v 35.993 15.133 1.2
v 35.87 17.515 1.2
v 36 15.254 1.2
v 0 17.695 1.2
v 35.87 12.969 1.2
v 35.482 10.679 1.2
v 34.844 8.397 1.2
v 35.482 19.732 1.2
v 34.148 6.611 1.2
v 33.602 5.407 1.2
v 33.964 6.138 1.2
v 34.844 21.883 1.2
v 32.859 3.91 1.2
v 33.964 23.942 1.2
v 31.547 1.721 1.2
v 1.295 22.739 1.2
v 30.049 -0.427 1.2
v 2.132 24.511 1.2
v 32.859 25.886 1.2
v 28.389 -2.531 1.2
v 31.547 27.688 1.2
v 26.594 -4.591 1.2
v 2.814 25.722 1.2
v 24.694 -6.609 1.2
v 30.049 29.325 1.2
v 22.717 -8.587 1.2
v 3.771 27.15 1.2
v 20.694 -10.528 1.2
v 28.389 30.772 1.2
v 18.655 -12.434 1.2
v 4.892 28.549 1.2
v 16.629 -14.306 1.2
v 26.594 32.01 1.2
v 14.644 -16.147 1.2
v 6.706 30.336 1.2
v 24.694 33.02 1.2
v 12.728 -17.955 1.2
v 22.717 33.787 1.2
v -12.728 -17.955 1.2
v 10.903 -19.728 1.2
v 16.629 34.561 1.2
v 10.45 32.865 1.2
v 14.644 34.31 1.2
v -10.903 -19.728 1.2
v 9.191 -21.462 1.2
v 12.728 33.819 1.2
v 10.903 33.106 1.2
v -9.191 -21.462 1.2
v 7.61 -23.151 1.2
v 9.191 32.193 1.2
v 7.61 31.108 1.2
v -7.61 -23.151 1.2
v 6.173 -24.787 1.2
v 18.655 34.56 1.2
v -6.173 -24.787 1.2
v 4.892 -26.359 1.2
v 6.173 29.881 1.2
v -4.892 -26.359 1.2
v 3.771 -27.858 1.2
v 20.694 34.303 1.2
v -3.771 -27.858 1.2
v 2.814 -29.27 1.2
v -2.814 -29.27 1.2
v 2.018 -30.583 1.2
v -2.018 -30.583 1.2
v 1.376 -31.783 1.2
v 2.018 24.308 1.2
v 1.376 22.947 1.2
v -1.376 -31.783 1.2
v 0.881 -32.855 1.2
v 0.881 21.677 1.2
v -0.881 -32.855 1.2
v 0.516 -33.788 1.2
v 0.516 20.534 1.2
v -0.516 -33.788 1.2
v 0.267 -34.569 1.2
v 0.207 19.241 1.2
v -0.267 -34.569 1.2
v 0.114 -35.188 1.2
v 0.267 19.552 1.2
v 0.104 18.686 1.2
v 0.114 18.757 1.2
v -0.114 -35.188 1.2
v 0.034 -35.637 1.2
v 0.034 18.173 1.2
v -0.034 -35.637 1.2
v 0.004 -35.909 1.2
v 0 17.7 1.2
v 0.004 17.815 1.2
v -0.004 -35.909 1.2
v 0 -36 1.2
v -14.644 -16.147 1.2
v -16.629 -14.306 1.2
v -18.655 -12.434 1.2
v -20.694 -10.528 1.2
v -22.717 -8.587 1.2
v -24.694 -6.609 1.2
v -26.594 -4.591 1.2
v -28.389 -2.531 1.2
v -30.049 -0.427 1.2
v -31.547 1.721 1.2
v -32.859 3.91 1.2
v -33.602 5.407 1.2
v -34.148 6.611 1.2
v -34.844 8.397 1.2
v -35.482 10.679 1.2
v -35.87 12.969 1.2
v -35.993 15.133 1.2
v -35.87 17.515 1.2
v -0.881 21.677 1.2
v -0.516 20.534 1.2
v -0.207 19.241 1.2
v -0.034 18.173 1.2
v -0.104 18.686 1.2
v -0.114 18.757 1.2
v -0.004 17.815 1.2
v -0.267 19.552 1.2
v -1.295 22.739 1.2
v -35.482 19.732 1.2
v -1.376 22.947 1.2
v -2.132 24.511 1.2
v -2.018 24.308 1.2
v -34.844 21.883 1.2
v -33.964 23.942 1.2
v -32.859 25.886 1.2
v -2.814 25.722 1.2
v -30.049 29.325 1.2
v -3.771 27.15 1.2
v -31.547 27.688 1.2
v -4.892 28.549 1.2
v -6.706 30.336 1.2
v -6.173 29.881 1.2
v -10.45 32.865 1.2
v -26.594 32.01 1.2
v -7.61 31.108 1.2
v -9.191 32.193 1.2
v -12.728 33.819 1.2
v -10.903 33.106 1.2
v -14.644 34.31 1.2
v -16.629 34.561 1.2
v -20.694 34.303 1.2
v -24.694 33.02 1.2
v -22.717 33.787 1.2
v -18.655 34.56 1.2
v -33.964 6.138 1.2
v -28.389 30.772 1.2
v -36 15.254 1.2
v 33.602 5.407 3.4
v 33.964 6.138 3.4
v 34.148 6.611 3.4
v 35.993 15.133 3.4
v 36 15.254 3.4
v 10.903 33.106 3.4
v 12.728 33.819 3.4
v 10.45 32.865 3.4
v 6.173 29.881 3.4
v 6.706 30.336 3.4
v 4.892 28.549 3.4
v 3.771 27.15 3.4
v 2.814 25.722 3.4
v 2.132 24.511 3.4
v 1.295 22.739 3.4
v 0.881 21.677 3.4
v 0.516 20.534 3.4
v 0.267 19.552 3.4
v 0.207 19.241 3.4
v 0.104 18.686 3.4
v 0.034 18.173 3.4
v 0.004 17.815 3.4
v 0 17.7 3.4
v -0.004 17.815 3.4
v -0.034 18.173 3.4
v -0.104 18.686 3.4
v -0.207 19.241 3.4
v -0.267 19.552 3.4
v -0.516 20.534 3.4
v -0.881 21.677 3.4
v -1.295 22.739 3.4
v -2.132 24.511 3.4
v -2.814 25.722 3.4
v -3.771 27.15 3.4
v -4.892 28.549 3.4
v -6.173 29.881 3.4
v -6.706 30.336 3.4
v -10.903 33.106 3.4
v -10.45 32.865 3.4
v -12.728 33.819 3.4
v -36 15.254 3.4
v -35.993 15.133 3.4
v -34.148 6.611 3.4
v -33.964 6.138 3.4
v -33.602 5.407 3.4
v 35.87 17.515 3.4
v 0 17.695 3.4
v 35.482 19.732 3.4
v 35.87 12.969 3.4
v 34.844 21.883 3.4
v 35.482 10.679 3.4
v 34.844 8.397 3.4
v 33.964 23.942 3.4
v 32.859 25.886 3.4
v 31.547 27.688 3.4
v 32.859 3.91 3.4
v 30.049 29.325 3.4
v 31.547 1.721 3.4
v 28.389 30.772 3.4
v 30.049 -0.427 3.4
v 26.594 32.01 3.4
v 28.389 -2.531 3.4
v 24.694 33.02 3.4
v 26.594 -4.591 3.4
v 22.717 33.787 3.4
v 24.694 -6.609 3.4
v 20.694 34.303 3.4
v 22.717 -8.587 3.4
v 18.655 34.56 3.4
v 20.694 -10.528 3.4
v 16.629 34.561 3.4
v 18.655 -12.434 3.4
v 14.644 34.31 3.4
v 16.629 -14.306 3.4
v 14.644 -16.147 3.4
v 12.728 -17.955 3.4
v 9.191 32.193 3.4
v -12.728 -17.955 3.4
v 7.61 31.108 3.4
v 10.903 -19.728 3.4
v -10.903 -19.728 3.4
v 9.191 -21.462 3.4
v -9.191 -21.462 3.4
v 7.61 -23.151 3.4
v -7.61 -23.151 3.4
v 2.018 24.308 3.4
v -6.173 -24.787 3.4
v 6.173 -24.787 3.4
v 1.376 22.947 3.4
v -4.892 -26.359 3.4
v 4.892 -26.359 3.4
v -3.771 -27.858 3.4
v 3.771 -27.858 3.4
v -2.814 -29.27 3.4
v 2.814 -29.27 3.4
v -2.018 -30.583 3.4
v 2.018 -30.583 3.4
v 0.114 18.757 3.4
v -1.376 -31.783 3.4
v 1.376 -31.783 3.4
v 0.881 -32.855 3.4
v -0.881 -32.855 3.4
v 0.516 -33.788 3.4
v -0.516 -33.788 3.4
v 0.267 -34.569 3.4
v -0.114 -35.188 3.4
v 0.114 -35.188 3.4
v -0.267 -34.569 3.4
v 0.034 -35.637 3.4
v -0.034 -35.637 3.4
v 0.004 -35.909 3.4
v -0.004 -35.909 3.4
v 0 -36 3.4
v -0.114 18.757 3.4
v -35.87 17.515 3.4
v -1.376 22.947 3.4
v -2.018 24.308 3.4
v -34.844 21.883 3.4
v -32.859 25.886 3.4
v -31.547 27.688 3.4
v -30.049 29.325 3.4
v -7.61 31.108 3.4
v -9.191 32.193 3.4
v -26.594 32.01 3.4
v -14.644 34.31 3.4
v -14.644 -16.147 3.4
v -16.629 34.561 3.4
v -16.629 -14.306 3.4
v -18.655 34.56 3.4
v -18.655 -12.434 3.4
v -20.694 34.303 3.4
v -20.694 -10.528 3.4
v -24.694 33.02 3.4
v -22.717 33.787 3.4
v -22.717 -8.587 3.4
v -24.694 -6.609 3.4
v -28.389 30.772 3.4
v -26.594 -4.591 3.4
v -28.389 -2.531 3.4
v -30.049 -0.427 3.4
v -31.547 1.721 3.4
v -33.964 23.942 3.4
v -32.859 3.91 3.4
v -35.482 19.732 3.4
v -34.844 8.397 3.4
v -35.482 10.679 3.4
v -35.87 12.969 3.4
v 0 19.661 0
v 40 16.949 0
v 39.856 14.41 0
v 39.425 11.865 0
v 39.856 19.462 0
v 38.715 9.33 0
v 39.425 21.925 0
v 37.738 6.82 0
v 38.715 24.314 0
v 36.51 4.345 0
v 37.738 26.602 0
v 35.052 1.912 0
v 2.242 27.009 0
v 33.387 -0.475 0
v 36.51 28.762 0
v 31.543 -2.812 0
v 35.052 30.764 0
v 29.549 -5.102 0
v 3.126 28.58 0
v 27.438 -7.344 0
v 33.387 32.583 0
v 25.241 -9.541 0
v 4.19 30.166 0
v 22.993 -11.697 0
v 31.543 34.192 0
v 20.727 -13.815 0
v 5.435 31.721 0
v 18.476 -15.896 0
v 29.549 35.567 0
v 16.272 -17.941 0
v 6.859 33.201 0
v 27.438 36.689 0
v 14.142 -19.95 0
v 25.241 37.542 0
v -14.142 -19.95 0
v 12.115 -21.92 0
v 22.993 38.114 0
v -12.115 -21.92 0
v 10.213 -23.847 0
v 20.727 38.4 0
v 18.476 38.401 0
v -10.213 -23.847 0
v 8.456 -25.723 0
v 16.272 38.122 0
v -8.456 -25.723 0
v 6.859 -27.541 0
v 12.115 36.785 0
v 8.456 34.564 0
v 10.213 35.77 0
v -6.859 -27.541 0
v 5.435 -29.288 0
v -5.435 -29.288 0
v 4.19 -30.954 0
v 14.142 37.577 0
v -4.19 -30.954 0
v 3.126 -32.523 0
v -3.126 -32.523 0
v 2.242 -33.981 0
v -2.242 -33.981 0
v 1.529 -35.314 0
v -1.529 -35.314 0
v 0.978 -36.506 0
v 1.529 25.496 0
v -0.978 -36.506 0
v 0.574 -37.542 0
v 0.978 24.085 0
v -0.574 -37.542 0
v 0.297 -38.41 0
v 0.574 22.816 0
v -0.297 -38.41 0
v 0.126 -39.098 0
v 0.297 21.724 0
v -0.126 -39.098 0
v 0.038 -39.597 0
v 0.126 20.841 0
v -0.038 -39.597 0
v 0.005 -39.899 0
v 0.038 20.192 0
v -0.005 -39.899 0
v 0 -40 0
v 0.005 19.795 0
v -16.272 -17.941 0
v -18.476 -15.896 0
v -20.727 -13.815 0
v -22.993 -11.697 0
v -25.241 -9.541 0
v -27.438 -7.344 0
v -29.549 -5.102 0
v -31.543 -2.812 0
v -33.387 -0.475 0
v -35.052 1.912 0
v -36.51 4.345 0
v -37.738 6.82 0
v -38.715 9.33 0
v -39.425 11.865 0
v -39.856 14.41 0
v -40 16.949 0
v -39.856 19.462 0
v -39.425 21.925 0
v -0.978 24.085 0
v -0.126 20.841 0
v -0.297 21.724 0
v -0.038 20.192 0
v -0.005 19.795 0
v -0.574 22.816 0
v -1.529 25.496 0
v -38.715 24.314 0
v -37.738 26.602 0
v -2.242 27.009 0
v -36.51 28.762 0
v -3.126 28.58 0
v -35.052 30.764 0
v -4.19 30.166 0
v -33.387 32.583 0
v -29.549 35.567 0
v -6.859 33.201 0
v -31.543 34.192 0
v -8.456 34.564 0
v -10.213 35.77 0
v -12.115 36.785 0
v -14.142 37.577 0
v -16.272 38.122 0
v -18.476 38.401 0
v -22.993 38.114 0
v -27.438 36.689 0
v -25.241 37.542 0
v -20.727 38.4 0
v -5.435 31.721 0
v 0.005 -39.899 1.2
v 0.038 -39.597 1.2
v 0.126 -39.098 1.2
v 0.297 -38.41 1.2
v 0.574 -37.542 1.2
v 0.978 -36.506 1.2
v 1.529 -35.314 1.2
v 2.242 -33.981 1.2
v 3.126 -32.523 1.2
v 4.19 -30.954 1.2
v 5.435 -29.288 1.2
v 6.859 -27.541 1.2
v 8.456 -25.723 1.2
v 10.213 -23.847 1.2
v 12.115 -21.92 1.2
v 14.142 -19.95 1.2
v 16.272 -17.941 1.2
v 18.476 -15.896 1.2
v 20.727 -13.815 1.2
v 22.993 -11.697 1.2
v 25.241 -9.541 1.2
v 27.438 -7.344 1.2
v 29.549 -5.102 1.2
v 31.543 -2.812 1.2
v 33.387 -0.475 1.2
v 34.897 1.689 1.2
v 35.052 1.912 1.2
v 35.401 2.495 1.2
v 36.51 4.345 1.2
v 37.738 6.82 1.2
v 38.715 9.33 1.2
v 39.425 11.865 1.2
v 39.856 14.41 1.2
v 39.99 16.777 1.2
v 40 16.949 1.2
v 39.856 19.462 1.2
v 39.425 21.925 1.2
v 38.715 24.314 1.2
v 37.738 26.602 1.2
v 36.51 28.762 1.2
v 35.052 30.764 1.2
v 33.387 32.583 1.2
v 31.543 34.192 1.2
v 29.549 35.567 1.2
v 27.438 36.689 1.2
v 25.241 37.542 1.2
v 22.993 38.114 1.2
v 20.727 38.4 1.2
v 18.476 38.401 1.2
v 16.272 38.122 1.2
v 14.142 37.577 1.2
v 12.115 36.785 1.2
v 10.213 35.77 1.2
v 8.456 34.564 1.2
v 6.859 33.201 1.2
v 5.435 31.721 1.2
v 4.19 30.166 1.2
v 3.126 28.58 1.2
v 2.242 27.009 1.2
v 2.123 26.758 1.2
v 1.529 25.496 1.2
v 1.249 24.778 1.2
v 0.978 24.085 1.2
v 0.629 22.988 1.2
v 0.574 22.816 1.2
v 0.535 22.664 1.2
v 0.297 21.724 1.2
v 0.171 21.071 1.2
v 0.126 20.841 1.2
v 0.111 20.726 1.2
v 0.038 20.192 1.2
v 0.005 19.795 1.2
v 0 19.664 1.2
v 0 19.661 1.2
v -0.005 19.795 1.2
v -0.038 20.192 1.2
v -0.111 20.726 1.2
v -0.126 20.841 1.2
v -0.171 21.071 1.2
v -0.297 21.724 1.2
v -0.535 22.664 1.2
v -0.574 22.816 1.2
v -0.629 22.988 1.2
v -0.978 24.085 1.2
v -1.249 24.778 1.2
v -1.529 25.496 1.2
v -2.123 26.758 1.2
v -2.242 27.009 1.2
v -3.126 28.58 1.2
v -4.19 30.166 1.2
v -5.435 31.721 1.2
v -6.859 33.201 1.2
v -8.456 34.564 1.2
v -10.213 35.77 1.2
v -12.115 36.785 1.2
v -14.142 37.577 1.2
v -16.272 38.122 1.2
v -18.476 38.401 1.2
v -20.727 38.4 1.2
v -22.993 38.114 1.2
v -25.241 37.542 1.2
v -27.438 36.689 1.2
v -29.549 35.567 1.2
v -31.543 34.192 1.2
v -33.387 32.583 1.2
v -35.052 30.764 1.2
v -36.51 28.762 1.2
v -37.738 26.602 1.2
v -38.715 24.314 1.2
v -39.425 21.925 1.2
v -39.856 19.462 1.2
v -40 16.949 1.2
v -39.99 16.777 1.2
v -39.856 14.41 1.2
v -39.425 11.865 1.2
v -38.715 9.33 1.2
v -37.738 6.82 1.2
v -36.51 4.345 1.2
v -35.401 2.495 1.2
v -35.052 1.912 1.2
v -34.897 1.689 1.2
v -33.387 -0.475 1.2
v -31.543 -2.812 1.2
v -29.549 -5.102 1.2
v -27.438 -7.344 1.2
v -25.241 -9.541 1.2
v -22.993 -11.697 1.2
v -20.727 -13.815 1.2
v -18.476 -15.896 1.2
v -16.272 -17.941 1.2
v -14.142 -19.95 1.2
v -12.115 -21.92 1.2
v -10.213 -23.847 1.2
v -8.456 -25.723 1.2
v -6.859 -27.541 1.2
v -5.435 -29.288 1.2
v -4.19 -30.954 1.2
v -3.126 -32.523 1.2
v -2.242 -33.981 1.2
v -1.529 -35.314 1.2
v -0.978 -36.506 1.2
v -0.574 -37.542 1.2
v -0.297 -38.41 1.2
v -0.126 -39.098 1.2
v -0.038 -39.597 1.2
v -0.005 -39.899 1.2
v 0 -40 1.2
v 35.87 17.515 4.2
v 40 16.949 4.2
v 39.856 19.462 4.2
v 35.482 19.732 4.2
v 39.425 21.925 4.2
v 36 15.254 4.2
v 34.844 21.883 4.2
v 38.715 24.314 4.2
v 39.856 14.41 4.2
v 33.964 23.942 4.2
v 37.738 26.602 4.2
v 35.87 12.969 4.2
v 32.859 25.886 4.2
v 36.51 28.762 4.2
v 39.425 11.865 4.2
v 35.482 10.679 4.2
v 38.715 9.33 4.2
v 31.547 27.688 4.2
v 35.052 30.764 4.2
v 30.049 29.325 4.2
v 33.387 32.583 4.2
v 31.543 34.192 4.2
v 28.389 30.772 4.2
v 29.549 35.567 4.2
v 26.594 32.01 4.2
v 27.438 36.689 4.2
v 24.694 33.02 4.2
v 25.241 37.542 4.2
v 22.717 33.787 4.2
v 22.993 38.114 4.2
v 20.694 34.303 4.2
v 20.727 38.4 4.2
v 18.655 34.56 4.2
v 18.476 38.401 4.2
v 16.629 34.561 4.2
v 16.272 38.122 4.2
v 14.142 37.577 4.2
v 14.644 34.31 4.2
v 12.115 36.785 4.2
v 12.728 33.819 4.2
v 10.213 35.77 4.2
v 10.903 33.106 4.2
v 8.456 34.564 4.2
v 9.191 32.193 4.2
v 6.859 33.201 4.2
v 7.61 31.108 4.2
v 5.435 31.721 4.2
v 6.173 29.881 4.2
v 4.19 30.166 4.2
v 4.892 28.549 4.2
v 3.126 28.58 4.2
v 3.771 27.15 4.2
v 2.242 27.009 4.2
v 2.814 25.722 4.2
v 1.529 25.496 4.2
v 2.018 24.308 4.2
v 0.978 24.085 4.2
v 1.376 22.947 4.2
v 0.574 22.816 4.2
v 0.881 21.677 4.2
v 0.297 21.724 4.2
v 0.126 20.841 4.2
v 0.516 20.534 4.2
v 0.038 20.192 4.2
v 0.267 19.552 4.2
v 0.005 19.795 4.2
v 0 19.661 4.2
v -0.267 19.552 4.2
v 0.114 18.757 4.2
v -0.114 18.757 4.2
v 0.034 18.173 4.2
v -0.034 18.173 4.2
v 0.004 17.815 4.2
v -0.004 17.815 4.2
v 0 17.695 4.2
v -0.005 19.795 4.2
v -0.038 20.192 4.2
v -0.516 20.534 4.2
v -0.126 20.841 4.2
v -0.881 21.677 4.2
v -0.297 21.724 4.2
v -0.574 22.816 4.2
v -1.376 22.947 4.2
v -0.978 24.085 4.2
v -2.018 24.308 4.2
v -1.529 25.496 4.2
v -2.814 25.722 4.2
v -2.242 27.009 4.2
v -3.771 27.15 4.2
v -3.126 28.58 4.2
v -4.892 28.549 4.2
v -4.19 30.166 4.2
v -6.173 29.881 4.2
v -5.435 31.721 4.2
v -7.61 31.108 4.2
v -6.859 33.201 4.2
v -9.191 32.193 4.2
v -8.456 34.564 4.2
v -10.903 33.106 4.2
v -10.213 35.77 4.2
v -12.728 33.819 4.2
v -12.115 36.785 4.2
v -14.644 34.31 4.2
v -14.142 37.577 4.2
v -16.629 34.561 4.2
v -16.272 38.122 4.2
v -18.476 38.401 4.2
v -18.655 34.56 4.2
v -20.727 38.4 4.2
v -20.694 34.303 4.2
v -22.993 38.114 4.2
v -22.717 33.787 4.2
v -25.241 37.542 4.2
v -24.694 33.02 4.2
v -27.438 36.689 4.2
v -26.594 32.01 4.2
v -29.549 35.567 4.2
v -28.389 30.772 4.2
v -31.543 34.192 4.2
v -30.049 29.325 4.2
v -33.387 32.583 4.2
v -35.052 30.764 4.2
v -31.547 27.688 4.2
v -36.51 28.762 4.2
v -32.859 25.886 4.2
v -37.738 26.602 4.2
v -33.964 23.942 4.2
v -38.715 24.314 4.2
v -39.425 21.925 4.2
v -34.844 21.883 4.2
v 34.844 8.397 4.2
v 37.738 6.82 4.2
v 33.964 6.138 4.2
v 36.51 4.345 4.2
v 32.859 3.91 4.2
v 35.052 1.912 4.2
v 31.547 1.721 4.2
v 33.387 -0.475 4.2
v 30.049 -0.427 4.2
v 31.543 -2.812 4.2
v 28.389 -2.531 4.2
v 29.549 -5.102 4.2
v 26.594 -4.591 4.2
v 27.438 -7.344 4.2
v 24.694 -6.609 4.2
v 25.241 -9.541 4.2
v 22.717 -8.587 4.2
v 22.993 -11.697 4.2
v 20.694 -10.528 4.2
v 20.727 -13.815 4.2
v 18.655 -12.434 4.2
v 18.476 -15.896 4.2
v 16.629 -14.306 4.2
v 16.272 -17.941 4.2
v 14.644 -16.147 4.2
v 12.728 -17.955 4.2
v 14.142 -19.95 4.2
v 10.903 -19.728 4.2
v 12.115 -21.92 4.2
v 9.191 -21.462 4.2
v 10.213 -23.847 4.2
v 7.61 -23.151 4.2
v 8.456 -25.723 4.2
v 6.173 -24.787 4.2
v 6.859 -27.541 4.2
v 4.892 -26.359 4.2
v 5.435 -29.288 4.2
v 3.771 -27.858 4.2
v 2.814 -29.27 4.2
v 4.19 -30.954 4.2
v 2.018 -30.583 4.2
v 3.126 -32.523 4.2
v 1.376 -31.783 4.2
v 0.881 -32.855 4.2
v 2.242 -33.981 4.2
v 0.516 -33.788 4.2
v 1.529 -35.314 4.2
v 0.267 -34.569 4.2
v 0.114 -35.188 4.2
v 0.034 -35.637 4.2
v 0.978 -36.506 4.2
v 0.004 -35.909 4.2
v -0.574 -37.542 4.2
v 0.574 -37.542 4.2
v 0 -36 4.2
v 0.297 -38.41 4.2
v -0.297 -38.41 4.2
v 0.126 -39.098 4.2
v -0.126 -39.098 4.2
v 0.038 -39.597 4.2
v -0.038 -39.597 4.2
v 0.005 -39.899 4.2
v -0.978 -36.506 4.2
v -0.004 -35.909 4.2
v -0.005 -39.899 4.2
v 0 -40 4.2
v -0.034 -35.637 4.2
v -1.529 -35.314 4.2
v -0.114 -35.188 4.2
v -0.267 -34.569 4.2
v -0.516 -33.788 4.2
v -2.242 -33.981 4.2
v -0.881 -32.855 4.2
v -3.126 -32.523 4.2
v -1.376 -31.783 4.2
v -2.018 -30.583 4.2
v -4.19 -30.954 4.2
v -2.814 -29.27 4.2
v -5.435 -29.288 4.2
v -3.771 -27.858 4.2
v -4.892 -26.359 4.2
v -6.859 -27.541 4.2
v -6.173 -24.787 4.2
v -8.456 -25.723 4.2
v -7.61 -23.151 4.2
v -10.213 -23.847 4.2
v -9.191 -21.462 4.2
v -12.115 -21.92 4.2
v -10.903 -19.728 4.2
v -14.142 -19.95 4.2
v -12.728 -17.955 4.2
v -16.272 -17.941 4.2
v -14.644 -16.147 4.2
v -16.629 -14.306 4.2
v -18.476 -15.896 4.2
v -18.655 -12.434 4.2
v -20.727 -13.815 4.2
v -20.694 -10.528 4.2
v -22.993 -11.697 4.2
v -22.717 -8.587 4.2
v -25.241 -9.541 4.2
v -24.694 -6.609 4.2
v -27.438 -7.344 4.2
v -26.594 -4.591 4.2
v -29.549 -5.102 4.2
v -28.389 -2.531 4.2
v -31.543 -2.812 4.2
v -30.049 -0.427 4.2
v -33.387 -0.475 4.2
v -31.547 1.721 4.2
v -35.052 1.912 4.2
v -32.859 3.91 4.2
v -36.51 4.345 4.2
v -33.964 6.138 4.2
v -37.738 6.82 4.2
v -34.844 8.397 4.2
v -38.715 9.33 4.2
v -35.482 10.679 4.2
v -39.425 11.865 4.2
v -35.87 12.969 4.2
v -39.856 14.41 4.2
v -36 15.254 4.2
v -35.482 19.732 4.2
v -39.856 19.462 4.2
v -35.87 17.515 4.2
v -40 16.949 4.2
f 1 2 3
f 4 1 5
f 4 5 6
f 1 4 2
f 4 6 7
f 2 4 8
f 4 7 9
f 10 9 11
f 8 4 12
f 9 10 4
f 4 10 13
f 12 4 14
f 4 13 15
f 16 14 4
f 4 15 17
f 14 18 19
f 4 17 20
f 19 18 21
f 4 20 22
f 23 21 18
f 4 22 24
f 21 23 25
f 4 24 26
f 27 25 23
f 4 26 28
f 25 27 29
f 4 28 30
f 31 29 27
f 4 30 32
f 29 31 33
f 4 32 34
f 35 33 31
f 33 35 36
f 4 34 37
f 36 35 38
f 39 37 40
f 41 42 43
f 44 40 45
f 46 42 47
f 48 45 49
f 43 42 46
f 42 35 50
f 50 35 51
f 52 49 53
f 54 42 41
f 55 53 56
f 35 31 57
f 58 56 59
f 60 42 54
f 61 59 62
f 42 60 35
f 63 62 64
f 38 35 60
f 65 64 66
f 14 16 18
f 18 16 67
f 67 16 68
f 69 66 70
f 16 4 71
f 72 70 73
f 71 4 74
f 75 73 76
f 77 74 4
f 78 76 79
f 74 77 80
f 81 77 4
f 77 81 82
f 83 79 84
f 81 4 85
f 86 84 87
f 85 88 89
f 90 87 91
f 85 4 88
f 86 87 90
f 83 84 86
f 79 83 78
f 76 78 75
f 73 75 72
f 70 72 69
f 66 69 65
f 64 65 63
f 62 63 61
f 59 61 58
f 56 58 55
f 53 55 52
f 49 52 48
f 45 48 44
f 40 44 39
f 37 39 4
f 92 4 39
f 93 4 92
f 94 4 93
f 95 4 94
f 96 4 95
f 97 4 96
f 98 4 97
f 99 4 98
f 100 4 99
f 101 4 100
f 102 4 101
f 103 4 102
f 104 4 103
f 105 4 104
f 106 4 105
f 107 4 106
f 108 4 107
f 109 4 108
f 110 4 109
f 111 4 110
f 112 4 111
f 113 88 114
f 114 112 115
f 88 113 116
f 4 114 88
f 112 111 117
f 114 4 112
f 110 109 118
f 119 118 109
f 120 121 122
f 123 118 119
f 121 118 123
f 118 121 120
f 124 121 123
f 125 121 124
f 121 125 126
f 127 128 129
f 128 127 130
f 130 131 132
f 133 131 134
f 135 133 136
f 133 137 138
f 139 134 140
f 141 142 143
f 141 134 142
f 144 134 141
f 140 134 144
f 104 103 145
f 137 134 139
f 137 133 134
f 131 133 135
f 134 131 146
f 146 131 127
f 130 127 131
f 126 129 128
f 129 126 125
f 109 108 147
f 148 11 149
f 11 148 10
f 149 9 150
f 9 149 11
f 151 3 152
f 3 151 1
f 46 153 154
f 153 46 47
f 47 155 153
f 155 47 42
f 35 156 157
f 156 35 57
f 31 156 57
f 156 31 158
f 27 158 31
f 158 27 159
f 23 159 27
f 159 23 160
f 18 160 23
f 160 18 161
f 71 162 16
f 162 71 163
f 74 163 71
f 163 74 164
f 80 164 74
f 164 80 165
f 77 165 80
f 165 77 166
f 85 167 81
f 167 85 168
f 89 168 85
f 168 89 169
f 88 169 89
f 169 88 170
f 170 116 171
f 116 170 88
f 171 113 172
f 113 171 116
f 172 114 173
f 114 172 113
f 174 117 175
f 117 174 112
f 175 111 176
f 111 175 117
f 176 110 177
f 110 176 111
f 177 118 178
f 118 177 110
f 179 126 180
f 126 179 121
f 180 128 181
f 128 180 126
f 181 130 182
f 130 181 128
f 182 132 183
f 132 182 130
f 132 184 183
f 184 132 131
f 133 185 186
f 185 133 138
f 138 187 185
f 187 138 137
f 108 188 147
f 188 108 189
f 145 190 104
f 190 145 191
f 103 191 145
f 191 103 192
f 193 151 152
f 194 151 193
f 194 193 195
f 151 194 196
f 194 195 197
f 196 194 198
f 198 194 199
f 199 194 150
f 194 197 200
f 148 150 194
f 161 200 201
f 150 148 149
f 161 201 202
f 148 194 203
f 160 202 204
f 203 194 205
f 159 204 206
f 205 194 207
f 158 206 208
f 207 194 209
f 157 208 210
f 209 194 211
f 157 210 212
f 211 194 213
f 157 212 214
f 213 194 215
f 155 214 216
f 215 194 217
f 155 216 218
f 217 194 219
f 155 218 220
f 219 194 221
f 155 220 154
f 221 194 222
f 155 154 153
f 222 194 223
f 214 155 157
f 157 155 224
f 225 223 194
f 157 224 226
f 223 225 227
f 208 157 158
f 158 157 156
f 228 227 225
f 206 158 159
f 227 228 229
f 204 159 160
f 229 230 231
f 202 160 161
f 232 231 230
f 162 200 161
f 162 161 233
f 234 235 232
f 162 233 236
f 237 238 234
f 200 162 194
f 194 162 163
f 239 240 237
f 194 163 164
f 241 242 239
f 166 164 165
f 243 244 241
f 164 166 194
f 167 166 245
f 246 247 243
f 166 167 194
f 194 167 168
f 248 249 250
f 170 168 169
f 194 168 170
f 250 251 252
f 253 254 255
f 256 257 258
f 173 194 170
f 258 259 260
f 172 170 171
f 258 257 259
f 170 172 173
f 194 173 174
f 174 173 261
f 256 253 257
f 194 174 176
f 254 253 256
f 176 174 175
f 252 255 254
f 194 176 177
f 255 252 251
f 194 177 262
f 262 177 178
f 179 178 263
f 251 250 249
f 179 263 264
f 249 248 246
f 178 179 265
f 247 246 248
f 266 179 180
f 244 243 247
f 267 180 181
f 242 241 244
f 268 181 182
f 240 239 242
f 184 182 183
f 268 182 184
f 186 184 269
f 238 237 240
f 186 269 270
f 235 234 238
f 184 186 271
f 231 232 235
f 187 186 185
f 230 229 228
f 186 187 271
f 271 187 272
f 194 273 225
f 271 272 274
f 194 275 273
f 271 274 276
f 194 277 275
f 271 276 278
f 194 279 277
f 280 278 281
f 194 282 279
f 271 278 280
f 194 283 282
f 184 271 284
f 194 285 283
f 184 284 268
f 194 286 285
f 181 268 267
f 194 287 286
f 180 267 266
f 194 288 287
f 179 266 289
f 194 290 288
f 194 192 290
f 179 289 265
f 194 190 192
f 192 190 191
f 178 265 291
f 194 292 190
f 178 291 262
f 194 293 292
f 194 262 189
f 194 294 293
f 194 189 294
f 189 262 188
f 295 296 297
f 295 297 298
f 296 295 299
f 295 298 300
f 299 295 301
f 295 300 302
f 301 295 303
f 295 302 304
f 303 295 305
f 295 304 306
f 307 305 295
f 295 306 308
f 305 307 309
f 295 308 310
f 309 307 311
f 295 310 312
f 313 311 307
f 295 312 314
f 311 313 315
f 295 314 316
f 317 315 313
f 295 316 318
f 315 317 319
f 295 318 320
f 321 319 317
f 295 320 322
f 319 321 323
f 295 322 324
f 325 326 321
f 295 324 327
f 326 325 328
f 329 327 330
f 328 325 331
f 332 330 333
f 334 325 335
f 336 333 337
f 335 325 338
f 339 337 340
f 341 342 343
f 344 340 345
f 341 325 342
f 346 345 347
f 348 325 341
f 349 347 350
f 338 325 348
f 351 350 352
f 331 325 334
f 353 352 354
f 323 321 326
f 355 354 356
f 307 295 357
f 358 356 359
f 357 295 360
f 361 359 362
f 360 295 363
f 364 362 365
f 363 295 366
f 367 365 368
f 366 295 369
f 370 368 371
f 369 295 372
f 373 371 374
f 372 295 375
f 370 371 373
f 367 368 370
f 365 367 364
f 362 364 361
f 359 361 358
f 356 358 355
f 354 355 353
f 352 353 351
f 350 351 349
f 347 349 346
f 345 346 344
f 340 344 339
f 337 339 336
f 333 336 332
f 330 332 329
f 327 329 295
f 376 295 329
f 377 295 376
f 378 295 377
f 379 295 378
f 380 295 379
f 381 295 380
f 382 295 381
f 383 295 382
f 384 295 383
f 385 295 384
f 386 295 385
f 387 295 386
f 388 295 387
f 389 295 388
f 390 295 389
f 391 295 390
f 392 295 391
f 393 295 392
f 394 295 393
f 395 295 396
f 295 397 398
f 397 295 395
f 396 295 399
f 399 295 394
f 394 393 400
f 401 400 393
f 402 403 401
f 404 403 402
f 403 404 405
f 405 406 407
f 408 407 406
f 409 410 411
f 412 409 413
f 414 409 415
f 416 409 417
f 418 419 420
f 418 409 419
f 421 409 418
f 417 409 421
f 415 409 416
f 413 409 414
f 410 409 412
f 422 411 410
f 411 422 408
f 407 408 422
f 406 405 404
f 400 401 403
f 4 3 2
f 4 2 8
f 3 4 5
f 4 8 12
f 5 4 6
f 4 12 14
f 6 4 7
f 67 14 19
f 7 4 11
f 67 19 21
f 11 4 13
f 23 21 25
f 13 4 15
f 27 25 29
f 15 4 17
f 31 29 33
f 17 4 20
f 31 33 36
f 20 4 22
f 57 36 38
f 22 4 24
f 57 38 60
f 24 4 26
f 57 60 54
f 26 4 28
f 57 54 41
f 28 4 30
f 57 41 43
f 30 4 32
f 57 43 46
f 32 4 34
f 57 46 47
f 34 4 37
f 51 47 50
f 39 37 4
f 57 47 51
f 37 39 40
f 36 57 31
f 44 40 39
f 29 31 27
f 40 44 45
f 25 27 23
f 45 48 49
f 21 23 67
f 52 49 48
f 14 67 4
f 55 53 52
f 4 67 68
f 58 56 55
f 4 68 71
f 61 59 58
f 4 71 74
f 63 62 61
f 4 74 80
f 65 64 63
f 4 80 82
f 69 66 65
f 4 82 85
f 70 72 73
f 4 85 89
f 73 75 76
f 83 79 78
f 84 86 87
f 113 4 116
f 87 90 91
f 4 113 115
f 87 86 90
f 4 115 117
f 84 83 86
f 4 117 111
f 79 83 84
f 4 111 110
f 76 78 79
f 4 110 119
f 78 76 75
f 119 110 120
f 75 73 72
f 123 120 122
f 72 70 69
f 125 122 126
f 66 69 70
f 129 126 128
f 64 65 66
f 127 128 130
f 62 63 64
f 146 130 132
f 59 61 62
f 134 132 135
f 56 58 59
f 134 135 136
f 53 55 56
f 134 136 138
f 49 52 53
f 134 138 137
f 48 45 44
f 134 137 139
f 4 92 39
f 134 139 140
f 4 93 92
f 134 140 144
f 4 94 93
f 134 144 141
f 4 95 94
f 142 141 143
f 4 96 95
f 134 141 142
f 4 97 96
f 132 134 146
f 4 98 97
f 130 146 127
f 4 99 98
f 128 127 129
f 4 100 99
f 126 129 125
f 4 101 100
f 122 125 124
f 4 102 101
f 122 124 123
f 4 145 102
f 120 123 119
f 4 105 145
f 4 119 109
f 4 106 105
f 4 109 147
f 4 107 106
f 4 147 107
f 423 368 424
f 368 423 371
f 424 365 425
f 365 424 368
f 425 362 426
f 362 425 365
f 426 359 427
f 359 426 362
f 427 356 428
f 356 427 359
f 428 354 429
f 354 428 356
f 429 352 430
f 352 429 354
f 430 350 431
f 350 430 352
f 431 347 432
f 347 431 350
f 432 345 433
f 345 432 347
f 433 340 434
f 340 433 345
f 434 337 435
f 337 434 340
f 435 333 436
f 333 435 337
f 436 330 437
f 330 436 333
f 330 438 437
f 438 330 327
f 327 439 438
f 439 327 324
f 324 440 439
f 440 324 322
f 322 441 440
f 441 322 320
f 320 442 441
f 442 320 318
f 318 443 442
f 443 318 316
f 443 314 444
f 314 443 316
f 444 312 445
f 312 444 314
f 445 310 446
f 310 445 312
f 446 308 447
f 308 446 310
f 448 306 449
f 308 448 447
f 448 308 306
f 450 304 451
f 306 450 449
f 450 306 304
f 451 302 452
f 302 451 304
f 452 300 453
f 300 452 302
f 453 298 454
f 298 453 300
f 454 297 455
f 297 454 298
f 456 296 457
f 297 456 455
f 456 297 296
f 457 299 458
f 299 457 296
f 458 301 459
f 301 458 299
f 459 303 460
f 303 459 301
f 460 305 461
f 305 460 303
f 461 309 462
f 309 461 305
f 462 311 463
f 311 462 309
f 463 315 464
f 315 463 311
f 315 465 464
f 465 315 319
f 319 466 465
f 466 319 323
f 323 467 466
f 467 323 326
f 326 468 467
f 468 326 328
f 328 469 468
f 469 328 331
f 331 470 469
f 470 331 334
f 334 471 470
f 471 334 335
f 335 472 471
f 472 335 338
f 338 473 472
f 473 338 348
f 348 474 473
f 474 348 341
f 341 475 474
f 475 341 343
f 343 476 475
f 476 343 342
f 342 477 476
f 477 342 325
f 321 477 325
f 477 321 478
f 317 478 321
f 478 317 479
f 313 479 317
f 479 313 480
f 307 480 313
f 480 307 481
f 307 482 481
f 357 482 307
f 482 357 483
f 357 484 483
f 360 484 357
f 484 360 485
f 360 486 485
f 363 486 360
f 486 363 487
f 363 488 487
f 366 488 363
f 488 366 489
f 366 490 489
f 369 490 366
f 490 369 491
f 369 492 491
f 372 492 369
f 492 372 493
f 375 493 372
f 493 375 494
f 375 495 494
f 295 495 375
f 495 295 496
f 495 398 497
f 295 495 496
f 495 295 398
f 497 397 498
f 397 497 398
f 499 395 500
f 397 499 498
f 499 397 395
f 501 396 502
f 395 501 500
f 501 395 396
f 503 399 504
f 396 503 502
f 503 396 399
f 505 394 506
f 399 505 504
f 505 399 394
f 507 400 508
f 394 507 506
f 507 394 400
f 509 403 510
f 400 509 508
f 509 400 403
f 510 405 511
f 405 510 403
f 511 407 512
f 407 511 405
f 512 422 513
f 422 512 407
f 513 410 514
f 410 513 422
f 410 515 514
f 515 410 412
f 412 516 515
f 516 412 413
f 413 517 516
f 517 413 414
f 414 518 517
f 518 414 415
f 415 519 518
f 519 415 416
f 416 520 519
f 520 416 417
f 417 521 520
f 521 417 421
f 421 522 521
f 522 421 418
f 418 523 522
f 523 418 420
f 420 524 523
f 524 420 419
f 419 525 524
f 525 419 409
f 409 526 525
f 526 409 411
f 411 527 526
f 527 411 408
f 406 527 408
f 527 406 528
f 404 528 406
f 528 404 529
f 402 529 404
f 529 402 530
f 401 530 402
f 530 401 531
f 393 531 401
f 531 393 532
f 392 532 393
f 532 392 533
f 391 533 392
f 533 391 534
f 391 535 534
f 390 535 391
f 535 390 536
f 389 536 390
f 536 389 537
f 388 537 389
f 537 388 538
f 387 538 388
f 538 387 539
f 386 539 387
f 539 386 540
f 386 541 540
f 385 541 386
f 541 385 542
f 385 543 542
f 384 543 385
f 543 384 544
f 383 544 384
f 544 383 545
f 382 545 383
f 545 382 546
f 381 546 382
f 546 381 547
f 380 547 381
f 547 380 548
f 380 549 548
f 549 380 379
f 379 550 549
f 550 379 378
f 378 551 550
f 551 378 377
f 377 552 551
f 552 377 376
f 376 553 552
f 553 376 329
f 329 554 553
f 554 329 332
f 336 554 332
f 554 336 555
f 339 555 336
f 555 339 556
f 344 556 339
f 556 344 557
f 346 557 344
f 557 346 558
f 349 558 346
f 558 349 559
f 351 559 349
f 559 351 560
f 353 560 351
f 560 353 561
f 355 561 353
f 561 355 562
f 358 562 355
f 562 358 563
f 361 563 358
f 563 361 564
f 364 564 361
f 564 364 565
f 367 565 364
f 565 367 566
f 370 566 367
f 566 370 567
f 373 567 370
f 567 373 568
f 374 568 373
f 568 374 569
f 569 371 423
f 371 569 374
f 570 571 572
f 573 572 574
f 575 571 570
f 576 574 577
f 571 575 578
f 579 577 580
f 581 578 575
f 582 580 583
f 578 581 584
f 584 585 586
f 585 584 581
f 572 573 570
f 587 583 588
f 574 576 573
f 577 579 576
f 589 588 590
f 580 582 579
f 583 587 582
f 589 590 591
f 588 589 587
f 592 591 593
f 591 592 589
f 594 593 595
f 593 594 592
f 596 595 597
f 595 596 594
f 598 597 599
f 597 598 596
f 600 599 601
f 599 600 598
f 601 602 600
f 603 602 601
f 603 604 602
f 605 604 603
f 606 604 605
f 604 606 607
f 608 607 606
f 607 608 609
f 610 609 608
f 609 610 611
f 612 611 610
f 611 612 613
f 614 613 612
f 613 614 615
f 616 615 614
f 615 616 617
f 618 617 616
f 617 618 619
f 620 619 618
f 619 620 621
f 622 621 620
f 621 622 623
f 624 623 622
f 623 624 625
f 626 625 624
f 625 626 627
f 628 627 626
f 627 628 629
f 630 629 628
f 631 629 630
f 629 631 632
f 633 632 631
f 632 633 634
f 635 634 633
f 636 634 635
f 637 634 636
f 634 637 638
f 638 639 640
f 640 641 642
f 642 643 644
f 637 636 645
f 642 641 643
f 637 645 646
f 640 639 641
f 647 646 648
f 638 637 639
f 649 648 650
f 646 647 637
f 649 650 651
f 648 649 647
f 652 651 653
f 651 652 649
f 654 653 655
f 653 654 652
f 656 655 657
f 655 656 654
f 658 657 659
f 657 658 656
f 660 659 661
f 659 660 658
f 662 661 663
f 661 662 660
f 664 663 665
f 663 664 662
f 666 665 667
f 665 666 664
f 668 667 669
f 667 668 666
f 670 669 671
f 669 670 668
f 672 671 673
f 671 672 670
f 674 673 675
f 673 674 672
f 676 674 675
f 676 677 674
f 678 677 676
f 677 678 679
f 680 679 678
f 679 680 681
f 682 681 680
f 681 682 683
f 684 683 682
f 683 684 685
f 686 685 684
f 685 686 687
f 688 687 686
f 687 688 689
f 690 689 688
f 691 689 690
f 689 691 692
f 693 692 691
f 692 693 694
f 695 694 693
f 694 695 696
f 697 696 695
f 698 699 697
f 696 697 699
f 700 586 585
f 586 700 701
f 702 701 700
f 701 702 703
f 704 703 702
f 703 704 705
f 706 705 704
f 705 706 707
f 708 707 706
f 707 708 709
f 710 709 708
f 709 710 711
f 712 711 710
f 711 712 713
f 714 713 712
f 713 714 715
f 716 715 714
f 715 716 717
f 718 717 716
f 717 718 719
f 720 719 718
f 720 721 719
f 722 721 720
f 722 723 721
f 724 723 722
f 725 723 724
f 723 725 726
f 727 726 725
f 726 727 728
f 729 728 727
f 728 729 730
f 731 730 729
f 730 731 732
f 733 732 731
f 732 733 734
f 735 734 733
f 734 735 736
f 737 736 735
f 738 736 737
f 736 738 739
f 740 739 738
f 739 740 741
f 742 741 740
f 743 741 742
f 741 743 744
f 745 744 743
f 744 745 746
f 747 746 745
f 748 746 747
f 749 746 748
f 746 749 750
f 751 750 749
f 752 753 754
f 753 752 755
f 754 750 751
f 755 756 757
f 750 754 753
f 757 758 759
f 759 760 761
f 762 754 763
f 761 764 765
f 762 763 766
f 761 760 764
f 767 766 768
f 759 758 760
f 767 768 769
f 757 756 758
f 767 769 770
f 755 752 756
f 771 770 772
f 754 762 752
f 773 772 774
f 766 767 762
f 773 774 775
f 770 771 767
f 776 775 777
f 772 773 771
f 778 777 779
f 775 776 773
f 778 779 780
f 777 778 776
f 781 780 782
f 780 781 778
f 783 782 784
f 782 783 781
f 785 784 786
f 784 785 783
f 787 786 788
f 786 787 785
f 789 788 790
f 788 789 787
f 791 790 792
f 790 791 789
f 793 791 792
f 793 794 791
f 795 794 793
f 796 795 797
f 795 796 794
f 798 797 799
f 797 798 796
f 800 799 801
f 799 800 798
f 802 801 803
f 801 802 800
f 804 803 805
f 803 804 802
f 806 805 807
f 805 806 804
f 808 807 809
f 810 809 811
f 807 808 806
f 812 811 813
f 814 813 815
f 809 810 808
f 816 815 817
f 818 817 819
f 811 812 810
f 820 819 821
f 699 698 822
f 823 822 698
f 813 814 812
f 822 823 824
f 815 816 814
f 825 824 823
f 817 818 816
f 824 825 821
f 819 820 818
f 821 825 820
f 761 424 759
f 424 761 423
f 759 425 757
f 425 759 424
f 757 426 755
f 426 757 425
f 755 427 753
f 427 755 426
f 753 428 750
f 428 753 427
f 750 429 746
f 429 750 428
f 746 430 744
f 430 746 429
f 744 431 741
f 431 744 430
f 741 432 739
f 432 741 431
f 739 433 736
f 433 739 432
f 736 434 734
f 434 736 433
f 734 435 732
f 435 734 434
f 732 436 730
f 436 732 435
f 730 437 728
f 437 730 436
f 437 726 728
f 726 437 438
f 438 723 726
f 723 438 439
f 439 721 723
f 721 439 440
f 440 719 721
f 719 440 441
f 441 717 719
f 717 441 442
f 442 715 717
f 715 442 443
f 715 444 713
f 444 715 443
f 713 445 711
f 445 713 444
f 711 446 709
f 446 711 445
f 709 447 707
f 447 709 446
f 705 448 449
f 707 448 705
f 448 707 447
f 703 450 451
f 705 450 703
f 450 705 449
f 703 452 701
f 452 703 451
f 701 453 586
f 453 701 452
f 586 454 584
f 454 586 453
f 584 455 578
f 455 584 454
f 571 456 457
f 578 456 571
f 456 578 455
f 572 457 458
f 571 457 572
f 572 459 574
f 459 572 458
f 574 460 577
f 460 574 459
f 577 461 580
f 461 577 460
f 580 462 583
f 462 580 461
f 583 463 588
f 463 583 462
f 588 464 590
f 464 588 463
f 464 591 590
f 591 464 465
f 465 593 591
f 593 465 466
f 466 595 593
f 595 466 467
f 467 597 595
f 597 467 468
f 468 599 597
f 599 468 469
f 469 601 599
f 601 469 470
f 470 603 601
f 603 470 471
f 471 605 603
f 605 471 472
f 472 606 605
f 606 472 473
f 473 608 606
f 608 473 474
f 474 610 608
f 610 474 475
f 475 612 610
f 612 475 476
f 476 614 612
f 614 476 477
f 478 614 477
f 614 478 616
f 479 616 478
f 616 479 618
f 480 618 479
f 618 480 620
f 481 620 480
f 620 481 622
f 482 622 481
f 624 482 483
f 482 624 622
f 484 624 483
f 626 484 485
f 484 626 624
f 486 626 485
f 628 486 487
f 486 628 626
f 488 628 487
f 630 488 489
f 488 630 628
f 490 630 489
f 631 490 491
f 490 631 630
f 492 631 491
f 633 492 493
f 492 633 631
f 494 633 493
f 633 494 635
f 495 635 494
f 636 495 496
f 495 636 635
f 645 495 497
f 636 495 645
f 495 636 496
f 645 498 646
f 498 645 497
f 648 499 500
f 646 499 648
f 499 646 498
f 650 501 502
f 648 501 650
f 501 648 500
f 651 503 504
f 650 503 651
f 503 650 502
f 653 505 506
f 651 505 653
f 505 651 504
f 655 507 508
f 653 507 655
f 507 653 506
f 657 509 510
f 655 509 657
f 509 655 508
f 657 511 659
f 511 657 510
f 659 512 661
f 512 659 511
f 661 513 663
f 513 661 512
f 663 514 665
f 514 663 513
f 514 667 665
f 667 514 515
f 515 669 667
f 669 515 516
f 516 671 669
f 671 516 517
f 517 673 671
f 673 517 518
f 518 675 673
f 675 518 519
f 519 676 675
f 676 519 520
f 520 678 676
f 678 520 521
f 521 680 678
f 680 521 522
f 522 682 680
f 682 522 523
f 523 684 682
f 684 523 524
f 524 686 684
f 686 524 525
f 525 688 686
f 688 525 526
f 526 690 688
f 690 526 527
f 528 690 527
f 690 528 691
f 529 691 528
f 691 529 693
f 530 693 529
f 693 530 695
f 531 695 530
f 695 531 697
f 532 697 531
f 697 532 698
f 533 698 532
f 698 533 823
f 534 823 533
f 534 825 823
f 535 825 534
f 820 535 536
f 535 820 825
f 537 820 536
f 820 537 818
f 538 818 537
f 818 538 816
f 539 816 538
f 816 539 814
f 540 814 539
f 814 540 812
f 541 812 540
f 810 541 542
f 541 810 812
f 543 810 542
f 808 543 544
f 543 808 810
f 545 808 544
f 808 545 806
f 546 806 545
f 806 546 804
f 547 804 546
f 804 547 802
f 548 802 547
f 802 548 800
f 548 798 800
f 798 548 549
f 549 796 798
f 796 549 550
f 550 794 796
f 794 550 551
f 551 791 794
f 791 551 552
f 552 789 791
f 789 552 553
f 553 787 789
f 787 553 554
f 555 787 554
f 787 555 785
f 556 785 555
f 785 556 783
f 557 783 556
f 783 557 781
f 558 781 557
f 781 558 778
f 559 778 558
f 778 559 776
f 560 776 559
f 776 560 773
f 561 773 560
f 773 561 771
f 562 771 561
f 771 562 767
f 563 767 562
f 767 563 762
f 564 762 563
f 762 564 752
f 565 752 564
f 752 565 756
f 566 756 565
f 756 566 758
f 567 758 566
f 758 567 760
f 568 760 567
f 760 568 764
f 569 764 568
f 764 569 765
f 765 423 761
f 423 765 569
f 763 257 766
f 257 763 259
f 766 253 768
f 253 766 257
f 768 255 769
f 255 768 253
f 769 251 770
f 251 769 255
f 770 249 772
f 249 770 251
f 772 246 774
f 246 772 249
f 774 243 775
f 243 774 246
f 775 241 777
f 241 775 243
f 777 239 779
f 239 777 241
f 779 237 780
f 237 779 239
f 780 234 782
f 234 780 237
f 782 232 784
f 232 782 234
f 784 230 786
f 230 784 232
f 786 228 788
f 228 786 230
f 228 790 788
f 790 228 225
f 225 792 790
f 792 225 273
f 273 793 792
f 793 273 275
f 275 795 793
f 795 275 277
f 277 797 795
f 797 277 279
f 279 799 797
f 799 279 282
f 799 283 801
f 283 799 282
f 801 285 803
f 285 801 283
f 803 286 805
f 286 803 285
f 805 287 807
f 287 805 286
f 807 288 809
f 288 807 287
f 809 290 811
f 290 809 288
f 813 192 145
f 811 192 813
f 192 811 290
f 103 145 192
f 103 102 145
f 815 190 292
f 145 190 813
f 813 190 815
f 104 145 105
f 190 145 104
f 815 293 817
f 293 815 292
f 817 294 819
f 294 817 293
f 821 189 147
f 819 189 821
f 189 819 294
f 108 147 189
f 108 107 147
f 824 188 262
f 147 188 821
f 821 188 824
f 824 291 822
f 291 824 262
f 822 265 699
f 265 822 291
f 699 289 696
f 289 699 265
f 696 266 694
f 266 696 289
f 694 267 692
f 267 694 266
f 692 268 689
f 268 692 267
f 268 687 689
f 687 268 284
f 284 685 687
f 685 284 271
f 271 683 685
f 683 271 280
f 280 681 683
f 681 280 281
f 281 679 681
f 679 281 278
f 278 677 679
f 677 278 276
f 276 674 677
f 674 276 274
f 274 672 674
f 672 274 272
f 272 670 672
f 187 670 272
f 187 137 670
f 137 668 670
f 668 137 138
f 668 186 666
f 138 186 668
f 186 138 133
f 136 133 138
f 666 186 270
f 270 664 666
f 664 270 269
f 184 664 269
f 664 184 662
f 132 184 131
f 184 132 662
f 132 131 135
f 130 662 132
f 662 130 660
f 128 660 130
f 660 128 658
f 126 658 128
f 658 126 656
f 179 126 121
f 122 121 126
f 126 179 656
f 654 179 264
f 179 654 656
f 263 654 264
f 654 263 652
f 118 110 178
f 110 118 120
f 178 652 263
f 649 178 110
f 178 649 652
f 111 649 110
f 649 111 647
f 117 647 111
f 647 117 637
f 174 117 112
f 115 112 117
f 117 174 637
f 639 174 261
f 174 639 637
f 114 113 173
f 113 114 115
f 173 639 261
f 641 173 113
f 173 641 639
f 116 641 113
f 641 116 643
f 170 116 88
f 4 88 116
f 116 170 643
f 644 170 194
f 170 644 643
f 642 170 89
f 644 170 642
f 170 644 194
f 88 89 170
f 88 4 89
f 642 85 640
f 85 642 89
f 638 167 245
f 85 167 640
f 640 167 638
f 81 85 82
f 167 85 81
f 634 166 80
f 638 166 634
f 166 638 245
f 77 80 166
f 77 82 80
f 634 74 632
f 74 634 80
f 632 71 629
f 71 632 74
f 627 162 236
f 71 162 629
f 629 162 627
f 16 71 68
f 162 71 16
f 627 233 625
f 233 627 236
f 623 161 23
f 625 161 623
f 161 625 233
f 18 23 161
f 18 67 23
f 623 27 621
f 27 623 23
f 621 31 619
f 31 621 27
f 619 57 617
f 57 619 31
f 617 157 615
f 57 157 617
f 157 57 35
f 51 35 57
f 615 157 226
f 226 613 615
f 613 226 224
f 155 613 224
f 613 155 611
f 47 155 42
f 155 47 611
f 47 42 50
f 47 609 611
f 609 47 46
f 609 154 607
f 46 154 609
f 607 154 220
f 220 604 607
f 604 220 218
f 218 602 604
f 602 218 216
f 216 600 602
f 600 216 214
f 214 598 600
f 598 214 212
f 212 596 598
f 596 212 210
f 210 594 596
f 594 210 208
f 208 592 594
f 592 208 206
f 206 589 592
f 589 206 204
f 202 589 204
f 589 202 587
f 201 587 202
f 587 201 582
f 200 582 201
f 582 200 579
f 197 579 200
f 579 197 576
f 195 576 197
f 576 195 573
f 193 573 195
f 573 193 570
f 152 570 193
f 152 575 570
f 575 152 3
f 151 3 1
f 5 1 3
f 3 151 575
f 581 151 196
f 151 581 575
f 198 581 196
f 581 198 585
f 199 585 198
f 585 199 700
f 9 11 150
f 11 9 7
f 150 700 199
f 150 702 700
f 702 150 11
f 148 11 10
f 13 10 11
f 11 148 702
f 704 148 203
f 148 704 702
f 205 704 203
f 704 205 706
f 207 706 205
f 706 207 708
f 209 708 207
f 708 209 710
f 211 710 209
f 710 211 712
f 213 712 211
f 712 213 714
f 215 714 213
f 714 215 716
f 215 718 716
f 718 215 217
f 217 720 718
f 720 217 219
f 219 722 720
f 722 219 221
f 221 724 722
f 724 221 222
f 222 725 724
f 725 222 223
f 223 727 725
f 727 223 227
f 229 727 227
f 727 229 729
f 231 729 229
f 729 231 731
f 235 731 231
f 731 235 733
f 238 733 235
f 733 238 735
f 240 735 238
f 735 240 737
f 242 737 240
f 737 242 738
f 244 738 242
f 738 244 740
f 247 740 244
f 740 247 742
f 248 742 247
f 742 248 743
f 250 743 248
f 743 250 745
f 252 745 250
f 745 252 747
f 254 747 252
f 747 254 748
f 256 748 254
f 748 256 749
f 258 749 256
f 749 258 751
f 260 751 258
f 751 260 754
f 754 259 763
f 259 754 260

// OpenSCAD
// lithophane_heart/model.scad
// Heart-shaped lithophane photo frame — single solid piece.
// Print flat (Z=0 face on bed). Display against a backlight, flat side
// toward the light source. Dark areas of the original photo print thick
// (pre-inverted by image_prep.py) so less light passes through them.
//
// Coordinate convention: centered at XY origin, Z grows up.

photo_path   = "";
photo_cols   = 200;
photo_rows   = 200;
heart_w      = 80;
heart_h      = 80;
min_thickness = 0.8;
max_thickness = 3.0;
frame_width   = 4;
base_height   = 1.2;

// ── Heart polygon ────────────────────────────────────────────────────────────
// Standard parametric heart:  x = 16·sin³t,  y = 13·cos t − 5·cos 2t − 2·cos 3t − cos 4t
// Angle t in degrees (OpenSCAD trig uses degrees).
// Approximate bounding box: x ∈ [−16, 16], y ∈ [−17, 12.5]  →  width≈32, height≈29.5
// We centre the shape in its bounding box then scale to the requested size.

function _hx(t) = 16 * pow(sin(t), 3);
function _hy(t) = 13*cos(t) - 5*cos(2*t) - 2*cos(3*t) - cos(4*t);

// Sample N=128 points, scale to (w × h), centred at the bounding-box midpoint.
module heart_2d(w, h) {
  N = 128;
  // Natural bbox centre: x=0, y=(-17+12.5)/2 ≈ -2.25
  // Natural bbox size:  32 × 29.5  →  normalise by 32 and 29.5
  scale([w / 32, h / 29.5])
    translate([0, 2.25])
      polygon([for (i = [0 : N-1])
        let(t = i * 360 / N)
        [_hx(t), _hy(t)]
      ]);
}

// ── Derived dimensions ───────────────────────────────────────────────────────
inner_w = heart_w - 2 * frame_width;
inner_h = heart_h - 2 * frame_width;

// ── Lithophane fill module ───────────────────────────────────────────────────
// Placed at Z=0 within this module; caller translates to base_height.
module litho_fill() {
  // Floor at min_thickness ensures no gaps at bright (thin) pixel areas.
  // Surface heightmap sits on top of the floor.
  intersection() {
    union() {
      // Solid floor: min_thickness tall, heart-shaped
      linear_extrude(height = min_thickness)
        heart_2d(inner_w, inner_h);

      // Heightmap: pixel value 0→0mm, 255→(max−min) mm, offset by min_thickness
      if (photo_path != "") {
        translate([0, 0, min_thickness])
          scale([inner_w  / photo_cols,
                 inner_h  / photo_rows,
                 (max_thickness - min_thickness) / 255.0])
            surface(file = photo_path, center = true, invert = false, convexity = 4);
      } else {
        // Placeholder when no photo is loaded — flat plate at max_thickness
        linear_extrude(height = max_thickness - min_thickness)
          heart_2d(inner_w, inner_h);
      }
    }
    // Clip rectangular surface to heart silhouette
    linear_extrude(height = max_thickness + 1)
      heart_2d(inner_w, inner_h);
  }
}

// ── Main solid ───────────────────────────────────────────────────────────────
union() {
  // 1. Full-heart base plate (entire silhouette, base_height thick)
  linear_extrude(height = base_height)
    heart_2d(heart_w, heart_h);

  // 2. Frame ring above the base (outer heart minus inner heart)
  translate([0, 0, base_height])
    linear_extrude(height = max_thickness)
      difference() {
        heart_2d(heart_w, heart_h);
        heart_2d(inner_w, inner_h);
      }

  // 3. Lithophane fill inside the frame
  translate([0, 0, base_height])
    litho_fill();
}
